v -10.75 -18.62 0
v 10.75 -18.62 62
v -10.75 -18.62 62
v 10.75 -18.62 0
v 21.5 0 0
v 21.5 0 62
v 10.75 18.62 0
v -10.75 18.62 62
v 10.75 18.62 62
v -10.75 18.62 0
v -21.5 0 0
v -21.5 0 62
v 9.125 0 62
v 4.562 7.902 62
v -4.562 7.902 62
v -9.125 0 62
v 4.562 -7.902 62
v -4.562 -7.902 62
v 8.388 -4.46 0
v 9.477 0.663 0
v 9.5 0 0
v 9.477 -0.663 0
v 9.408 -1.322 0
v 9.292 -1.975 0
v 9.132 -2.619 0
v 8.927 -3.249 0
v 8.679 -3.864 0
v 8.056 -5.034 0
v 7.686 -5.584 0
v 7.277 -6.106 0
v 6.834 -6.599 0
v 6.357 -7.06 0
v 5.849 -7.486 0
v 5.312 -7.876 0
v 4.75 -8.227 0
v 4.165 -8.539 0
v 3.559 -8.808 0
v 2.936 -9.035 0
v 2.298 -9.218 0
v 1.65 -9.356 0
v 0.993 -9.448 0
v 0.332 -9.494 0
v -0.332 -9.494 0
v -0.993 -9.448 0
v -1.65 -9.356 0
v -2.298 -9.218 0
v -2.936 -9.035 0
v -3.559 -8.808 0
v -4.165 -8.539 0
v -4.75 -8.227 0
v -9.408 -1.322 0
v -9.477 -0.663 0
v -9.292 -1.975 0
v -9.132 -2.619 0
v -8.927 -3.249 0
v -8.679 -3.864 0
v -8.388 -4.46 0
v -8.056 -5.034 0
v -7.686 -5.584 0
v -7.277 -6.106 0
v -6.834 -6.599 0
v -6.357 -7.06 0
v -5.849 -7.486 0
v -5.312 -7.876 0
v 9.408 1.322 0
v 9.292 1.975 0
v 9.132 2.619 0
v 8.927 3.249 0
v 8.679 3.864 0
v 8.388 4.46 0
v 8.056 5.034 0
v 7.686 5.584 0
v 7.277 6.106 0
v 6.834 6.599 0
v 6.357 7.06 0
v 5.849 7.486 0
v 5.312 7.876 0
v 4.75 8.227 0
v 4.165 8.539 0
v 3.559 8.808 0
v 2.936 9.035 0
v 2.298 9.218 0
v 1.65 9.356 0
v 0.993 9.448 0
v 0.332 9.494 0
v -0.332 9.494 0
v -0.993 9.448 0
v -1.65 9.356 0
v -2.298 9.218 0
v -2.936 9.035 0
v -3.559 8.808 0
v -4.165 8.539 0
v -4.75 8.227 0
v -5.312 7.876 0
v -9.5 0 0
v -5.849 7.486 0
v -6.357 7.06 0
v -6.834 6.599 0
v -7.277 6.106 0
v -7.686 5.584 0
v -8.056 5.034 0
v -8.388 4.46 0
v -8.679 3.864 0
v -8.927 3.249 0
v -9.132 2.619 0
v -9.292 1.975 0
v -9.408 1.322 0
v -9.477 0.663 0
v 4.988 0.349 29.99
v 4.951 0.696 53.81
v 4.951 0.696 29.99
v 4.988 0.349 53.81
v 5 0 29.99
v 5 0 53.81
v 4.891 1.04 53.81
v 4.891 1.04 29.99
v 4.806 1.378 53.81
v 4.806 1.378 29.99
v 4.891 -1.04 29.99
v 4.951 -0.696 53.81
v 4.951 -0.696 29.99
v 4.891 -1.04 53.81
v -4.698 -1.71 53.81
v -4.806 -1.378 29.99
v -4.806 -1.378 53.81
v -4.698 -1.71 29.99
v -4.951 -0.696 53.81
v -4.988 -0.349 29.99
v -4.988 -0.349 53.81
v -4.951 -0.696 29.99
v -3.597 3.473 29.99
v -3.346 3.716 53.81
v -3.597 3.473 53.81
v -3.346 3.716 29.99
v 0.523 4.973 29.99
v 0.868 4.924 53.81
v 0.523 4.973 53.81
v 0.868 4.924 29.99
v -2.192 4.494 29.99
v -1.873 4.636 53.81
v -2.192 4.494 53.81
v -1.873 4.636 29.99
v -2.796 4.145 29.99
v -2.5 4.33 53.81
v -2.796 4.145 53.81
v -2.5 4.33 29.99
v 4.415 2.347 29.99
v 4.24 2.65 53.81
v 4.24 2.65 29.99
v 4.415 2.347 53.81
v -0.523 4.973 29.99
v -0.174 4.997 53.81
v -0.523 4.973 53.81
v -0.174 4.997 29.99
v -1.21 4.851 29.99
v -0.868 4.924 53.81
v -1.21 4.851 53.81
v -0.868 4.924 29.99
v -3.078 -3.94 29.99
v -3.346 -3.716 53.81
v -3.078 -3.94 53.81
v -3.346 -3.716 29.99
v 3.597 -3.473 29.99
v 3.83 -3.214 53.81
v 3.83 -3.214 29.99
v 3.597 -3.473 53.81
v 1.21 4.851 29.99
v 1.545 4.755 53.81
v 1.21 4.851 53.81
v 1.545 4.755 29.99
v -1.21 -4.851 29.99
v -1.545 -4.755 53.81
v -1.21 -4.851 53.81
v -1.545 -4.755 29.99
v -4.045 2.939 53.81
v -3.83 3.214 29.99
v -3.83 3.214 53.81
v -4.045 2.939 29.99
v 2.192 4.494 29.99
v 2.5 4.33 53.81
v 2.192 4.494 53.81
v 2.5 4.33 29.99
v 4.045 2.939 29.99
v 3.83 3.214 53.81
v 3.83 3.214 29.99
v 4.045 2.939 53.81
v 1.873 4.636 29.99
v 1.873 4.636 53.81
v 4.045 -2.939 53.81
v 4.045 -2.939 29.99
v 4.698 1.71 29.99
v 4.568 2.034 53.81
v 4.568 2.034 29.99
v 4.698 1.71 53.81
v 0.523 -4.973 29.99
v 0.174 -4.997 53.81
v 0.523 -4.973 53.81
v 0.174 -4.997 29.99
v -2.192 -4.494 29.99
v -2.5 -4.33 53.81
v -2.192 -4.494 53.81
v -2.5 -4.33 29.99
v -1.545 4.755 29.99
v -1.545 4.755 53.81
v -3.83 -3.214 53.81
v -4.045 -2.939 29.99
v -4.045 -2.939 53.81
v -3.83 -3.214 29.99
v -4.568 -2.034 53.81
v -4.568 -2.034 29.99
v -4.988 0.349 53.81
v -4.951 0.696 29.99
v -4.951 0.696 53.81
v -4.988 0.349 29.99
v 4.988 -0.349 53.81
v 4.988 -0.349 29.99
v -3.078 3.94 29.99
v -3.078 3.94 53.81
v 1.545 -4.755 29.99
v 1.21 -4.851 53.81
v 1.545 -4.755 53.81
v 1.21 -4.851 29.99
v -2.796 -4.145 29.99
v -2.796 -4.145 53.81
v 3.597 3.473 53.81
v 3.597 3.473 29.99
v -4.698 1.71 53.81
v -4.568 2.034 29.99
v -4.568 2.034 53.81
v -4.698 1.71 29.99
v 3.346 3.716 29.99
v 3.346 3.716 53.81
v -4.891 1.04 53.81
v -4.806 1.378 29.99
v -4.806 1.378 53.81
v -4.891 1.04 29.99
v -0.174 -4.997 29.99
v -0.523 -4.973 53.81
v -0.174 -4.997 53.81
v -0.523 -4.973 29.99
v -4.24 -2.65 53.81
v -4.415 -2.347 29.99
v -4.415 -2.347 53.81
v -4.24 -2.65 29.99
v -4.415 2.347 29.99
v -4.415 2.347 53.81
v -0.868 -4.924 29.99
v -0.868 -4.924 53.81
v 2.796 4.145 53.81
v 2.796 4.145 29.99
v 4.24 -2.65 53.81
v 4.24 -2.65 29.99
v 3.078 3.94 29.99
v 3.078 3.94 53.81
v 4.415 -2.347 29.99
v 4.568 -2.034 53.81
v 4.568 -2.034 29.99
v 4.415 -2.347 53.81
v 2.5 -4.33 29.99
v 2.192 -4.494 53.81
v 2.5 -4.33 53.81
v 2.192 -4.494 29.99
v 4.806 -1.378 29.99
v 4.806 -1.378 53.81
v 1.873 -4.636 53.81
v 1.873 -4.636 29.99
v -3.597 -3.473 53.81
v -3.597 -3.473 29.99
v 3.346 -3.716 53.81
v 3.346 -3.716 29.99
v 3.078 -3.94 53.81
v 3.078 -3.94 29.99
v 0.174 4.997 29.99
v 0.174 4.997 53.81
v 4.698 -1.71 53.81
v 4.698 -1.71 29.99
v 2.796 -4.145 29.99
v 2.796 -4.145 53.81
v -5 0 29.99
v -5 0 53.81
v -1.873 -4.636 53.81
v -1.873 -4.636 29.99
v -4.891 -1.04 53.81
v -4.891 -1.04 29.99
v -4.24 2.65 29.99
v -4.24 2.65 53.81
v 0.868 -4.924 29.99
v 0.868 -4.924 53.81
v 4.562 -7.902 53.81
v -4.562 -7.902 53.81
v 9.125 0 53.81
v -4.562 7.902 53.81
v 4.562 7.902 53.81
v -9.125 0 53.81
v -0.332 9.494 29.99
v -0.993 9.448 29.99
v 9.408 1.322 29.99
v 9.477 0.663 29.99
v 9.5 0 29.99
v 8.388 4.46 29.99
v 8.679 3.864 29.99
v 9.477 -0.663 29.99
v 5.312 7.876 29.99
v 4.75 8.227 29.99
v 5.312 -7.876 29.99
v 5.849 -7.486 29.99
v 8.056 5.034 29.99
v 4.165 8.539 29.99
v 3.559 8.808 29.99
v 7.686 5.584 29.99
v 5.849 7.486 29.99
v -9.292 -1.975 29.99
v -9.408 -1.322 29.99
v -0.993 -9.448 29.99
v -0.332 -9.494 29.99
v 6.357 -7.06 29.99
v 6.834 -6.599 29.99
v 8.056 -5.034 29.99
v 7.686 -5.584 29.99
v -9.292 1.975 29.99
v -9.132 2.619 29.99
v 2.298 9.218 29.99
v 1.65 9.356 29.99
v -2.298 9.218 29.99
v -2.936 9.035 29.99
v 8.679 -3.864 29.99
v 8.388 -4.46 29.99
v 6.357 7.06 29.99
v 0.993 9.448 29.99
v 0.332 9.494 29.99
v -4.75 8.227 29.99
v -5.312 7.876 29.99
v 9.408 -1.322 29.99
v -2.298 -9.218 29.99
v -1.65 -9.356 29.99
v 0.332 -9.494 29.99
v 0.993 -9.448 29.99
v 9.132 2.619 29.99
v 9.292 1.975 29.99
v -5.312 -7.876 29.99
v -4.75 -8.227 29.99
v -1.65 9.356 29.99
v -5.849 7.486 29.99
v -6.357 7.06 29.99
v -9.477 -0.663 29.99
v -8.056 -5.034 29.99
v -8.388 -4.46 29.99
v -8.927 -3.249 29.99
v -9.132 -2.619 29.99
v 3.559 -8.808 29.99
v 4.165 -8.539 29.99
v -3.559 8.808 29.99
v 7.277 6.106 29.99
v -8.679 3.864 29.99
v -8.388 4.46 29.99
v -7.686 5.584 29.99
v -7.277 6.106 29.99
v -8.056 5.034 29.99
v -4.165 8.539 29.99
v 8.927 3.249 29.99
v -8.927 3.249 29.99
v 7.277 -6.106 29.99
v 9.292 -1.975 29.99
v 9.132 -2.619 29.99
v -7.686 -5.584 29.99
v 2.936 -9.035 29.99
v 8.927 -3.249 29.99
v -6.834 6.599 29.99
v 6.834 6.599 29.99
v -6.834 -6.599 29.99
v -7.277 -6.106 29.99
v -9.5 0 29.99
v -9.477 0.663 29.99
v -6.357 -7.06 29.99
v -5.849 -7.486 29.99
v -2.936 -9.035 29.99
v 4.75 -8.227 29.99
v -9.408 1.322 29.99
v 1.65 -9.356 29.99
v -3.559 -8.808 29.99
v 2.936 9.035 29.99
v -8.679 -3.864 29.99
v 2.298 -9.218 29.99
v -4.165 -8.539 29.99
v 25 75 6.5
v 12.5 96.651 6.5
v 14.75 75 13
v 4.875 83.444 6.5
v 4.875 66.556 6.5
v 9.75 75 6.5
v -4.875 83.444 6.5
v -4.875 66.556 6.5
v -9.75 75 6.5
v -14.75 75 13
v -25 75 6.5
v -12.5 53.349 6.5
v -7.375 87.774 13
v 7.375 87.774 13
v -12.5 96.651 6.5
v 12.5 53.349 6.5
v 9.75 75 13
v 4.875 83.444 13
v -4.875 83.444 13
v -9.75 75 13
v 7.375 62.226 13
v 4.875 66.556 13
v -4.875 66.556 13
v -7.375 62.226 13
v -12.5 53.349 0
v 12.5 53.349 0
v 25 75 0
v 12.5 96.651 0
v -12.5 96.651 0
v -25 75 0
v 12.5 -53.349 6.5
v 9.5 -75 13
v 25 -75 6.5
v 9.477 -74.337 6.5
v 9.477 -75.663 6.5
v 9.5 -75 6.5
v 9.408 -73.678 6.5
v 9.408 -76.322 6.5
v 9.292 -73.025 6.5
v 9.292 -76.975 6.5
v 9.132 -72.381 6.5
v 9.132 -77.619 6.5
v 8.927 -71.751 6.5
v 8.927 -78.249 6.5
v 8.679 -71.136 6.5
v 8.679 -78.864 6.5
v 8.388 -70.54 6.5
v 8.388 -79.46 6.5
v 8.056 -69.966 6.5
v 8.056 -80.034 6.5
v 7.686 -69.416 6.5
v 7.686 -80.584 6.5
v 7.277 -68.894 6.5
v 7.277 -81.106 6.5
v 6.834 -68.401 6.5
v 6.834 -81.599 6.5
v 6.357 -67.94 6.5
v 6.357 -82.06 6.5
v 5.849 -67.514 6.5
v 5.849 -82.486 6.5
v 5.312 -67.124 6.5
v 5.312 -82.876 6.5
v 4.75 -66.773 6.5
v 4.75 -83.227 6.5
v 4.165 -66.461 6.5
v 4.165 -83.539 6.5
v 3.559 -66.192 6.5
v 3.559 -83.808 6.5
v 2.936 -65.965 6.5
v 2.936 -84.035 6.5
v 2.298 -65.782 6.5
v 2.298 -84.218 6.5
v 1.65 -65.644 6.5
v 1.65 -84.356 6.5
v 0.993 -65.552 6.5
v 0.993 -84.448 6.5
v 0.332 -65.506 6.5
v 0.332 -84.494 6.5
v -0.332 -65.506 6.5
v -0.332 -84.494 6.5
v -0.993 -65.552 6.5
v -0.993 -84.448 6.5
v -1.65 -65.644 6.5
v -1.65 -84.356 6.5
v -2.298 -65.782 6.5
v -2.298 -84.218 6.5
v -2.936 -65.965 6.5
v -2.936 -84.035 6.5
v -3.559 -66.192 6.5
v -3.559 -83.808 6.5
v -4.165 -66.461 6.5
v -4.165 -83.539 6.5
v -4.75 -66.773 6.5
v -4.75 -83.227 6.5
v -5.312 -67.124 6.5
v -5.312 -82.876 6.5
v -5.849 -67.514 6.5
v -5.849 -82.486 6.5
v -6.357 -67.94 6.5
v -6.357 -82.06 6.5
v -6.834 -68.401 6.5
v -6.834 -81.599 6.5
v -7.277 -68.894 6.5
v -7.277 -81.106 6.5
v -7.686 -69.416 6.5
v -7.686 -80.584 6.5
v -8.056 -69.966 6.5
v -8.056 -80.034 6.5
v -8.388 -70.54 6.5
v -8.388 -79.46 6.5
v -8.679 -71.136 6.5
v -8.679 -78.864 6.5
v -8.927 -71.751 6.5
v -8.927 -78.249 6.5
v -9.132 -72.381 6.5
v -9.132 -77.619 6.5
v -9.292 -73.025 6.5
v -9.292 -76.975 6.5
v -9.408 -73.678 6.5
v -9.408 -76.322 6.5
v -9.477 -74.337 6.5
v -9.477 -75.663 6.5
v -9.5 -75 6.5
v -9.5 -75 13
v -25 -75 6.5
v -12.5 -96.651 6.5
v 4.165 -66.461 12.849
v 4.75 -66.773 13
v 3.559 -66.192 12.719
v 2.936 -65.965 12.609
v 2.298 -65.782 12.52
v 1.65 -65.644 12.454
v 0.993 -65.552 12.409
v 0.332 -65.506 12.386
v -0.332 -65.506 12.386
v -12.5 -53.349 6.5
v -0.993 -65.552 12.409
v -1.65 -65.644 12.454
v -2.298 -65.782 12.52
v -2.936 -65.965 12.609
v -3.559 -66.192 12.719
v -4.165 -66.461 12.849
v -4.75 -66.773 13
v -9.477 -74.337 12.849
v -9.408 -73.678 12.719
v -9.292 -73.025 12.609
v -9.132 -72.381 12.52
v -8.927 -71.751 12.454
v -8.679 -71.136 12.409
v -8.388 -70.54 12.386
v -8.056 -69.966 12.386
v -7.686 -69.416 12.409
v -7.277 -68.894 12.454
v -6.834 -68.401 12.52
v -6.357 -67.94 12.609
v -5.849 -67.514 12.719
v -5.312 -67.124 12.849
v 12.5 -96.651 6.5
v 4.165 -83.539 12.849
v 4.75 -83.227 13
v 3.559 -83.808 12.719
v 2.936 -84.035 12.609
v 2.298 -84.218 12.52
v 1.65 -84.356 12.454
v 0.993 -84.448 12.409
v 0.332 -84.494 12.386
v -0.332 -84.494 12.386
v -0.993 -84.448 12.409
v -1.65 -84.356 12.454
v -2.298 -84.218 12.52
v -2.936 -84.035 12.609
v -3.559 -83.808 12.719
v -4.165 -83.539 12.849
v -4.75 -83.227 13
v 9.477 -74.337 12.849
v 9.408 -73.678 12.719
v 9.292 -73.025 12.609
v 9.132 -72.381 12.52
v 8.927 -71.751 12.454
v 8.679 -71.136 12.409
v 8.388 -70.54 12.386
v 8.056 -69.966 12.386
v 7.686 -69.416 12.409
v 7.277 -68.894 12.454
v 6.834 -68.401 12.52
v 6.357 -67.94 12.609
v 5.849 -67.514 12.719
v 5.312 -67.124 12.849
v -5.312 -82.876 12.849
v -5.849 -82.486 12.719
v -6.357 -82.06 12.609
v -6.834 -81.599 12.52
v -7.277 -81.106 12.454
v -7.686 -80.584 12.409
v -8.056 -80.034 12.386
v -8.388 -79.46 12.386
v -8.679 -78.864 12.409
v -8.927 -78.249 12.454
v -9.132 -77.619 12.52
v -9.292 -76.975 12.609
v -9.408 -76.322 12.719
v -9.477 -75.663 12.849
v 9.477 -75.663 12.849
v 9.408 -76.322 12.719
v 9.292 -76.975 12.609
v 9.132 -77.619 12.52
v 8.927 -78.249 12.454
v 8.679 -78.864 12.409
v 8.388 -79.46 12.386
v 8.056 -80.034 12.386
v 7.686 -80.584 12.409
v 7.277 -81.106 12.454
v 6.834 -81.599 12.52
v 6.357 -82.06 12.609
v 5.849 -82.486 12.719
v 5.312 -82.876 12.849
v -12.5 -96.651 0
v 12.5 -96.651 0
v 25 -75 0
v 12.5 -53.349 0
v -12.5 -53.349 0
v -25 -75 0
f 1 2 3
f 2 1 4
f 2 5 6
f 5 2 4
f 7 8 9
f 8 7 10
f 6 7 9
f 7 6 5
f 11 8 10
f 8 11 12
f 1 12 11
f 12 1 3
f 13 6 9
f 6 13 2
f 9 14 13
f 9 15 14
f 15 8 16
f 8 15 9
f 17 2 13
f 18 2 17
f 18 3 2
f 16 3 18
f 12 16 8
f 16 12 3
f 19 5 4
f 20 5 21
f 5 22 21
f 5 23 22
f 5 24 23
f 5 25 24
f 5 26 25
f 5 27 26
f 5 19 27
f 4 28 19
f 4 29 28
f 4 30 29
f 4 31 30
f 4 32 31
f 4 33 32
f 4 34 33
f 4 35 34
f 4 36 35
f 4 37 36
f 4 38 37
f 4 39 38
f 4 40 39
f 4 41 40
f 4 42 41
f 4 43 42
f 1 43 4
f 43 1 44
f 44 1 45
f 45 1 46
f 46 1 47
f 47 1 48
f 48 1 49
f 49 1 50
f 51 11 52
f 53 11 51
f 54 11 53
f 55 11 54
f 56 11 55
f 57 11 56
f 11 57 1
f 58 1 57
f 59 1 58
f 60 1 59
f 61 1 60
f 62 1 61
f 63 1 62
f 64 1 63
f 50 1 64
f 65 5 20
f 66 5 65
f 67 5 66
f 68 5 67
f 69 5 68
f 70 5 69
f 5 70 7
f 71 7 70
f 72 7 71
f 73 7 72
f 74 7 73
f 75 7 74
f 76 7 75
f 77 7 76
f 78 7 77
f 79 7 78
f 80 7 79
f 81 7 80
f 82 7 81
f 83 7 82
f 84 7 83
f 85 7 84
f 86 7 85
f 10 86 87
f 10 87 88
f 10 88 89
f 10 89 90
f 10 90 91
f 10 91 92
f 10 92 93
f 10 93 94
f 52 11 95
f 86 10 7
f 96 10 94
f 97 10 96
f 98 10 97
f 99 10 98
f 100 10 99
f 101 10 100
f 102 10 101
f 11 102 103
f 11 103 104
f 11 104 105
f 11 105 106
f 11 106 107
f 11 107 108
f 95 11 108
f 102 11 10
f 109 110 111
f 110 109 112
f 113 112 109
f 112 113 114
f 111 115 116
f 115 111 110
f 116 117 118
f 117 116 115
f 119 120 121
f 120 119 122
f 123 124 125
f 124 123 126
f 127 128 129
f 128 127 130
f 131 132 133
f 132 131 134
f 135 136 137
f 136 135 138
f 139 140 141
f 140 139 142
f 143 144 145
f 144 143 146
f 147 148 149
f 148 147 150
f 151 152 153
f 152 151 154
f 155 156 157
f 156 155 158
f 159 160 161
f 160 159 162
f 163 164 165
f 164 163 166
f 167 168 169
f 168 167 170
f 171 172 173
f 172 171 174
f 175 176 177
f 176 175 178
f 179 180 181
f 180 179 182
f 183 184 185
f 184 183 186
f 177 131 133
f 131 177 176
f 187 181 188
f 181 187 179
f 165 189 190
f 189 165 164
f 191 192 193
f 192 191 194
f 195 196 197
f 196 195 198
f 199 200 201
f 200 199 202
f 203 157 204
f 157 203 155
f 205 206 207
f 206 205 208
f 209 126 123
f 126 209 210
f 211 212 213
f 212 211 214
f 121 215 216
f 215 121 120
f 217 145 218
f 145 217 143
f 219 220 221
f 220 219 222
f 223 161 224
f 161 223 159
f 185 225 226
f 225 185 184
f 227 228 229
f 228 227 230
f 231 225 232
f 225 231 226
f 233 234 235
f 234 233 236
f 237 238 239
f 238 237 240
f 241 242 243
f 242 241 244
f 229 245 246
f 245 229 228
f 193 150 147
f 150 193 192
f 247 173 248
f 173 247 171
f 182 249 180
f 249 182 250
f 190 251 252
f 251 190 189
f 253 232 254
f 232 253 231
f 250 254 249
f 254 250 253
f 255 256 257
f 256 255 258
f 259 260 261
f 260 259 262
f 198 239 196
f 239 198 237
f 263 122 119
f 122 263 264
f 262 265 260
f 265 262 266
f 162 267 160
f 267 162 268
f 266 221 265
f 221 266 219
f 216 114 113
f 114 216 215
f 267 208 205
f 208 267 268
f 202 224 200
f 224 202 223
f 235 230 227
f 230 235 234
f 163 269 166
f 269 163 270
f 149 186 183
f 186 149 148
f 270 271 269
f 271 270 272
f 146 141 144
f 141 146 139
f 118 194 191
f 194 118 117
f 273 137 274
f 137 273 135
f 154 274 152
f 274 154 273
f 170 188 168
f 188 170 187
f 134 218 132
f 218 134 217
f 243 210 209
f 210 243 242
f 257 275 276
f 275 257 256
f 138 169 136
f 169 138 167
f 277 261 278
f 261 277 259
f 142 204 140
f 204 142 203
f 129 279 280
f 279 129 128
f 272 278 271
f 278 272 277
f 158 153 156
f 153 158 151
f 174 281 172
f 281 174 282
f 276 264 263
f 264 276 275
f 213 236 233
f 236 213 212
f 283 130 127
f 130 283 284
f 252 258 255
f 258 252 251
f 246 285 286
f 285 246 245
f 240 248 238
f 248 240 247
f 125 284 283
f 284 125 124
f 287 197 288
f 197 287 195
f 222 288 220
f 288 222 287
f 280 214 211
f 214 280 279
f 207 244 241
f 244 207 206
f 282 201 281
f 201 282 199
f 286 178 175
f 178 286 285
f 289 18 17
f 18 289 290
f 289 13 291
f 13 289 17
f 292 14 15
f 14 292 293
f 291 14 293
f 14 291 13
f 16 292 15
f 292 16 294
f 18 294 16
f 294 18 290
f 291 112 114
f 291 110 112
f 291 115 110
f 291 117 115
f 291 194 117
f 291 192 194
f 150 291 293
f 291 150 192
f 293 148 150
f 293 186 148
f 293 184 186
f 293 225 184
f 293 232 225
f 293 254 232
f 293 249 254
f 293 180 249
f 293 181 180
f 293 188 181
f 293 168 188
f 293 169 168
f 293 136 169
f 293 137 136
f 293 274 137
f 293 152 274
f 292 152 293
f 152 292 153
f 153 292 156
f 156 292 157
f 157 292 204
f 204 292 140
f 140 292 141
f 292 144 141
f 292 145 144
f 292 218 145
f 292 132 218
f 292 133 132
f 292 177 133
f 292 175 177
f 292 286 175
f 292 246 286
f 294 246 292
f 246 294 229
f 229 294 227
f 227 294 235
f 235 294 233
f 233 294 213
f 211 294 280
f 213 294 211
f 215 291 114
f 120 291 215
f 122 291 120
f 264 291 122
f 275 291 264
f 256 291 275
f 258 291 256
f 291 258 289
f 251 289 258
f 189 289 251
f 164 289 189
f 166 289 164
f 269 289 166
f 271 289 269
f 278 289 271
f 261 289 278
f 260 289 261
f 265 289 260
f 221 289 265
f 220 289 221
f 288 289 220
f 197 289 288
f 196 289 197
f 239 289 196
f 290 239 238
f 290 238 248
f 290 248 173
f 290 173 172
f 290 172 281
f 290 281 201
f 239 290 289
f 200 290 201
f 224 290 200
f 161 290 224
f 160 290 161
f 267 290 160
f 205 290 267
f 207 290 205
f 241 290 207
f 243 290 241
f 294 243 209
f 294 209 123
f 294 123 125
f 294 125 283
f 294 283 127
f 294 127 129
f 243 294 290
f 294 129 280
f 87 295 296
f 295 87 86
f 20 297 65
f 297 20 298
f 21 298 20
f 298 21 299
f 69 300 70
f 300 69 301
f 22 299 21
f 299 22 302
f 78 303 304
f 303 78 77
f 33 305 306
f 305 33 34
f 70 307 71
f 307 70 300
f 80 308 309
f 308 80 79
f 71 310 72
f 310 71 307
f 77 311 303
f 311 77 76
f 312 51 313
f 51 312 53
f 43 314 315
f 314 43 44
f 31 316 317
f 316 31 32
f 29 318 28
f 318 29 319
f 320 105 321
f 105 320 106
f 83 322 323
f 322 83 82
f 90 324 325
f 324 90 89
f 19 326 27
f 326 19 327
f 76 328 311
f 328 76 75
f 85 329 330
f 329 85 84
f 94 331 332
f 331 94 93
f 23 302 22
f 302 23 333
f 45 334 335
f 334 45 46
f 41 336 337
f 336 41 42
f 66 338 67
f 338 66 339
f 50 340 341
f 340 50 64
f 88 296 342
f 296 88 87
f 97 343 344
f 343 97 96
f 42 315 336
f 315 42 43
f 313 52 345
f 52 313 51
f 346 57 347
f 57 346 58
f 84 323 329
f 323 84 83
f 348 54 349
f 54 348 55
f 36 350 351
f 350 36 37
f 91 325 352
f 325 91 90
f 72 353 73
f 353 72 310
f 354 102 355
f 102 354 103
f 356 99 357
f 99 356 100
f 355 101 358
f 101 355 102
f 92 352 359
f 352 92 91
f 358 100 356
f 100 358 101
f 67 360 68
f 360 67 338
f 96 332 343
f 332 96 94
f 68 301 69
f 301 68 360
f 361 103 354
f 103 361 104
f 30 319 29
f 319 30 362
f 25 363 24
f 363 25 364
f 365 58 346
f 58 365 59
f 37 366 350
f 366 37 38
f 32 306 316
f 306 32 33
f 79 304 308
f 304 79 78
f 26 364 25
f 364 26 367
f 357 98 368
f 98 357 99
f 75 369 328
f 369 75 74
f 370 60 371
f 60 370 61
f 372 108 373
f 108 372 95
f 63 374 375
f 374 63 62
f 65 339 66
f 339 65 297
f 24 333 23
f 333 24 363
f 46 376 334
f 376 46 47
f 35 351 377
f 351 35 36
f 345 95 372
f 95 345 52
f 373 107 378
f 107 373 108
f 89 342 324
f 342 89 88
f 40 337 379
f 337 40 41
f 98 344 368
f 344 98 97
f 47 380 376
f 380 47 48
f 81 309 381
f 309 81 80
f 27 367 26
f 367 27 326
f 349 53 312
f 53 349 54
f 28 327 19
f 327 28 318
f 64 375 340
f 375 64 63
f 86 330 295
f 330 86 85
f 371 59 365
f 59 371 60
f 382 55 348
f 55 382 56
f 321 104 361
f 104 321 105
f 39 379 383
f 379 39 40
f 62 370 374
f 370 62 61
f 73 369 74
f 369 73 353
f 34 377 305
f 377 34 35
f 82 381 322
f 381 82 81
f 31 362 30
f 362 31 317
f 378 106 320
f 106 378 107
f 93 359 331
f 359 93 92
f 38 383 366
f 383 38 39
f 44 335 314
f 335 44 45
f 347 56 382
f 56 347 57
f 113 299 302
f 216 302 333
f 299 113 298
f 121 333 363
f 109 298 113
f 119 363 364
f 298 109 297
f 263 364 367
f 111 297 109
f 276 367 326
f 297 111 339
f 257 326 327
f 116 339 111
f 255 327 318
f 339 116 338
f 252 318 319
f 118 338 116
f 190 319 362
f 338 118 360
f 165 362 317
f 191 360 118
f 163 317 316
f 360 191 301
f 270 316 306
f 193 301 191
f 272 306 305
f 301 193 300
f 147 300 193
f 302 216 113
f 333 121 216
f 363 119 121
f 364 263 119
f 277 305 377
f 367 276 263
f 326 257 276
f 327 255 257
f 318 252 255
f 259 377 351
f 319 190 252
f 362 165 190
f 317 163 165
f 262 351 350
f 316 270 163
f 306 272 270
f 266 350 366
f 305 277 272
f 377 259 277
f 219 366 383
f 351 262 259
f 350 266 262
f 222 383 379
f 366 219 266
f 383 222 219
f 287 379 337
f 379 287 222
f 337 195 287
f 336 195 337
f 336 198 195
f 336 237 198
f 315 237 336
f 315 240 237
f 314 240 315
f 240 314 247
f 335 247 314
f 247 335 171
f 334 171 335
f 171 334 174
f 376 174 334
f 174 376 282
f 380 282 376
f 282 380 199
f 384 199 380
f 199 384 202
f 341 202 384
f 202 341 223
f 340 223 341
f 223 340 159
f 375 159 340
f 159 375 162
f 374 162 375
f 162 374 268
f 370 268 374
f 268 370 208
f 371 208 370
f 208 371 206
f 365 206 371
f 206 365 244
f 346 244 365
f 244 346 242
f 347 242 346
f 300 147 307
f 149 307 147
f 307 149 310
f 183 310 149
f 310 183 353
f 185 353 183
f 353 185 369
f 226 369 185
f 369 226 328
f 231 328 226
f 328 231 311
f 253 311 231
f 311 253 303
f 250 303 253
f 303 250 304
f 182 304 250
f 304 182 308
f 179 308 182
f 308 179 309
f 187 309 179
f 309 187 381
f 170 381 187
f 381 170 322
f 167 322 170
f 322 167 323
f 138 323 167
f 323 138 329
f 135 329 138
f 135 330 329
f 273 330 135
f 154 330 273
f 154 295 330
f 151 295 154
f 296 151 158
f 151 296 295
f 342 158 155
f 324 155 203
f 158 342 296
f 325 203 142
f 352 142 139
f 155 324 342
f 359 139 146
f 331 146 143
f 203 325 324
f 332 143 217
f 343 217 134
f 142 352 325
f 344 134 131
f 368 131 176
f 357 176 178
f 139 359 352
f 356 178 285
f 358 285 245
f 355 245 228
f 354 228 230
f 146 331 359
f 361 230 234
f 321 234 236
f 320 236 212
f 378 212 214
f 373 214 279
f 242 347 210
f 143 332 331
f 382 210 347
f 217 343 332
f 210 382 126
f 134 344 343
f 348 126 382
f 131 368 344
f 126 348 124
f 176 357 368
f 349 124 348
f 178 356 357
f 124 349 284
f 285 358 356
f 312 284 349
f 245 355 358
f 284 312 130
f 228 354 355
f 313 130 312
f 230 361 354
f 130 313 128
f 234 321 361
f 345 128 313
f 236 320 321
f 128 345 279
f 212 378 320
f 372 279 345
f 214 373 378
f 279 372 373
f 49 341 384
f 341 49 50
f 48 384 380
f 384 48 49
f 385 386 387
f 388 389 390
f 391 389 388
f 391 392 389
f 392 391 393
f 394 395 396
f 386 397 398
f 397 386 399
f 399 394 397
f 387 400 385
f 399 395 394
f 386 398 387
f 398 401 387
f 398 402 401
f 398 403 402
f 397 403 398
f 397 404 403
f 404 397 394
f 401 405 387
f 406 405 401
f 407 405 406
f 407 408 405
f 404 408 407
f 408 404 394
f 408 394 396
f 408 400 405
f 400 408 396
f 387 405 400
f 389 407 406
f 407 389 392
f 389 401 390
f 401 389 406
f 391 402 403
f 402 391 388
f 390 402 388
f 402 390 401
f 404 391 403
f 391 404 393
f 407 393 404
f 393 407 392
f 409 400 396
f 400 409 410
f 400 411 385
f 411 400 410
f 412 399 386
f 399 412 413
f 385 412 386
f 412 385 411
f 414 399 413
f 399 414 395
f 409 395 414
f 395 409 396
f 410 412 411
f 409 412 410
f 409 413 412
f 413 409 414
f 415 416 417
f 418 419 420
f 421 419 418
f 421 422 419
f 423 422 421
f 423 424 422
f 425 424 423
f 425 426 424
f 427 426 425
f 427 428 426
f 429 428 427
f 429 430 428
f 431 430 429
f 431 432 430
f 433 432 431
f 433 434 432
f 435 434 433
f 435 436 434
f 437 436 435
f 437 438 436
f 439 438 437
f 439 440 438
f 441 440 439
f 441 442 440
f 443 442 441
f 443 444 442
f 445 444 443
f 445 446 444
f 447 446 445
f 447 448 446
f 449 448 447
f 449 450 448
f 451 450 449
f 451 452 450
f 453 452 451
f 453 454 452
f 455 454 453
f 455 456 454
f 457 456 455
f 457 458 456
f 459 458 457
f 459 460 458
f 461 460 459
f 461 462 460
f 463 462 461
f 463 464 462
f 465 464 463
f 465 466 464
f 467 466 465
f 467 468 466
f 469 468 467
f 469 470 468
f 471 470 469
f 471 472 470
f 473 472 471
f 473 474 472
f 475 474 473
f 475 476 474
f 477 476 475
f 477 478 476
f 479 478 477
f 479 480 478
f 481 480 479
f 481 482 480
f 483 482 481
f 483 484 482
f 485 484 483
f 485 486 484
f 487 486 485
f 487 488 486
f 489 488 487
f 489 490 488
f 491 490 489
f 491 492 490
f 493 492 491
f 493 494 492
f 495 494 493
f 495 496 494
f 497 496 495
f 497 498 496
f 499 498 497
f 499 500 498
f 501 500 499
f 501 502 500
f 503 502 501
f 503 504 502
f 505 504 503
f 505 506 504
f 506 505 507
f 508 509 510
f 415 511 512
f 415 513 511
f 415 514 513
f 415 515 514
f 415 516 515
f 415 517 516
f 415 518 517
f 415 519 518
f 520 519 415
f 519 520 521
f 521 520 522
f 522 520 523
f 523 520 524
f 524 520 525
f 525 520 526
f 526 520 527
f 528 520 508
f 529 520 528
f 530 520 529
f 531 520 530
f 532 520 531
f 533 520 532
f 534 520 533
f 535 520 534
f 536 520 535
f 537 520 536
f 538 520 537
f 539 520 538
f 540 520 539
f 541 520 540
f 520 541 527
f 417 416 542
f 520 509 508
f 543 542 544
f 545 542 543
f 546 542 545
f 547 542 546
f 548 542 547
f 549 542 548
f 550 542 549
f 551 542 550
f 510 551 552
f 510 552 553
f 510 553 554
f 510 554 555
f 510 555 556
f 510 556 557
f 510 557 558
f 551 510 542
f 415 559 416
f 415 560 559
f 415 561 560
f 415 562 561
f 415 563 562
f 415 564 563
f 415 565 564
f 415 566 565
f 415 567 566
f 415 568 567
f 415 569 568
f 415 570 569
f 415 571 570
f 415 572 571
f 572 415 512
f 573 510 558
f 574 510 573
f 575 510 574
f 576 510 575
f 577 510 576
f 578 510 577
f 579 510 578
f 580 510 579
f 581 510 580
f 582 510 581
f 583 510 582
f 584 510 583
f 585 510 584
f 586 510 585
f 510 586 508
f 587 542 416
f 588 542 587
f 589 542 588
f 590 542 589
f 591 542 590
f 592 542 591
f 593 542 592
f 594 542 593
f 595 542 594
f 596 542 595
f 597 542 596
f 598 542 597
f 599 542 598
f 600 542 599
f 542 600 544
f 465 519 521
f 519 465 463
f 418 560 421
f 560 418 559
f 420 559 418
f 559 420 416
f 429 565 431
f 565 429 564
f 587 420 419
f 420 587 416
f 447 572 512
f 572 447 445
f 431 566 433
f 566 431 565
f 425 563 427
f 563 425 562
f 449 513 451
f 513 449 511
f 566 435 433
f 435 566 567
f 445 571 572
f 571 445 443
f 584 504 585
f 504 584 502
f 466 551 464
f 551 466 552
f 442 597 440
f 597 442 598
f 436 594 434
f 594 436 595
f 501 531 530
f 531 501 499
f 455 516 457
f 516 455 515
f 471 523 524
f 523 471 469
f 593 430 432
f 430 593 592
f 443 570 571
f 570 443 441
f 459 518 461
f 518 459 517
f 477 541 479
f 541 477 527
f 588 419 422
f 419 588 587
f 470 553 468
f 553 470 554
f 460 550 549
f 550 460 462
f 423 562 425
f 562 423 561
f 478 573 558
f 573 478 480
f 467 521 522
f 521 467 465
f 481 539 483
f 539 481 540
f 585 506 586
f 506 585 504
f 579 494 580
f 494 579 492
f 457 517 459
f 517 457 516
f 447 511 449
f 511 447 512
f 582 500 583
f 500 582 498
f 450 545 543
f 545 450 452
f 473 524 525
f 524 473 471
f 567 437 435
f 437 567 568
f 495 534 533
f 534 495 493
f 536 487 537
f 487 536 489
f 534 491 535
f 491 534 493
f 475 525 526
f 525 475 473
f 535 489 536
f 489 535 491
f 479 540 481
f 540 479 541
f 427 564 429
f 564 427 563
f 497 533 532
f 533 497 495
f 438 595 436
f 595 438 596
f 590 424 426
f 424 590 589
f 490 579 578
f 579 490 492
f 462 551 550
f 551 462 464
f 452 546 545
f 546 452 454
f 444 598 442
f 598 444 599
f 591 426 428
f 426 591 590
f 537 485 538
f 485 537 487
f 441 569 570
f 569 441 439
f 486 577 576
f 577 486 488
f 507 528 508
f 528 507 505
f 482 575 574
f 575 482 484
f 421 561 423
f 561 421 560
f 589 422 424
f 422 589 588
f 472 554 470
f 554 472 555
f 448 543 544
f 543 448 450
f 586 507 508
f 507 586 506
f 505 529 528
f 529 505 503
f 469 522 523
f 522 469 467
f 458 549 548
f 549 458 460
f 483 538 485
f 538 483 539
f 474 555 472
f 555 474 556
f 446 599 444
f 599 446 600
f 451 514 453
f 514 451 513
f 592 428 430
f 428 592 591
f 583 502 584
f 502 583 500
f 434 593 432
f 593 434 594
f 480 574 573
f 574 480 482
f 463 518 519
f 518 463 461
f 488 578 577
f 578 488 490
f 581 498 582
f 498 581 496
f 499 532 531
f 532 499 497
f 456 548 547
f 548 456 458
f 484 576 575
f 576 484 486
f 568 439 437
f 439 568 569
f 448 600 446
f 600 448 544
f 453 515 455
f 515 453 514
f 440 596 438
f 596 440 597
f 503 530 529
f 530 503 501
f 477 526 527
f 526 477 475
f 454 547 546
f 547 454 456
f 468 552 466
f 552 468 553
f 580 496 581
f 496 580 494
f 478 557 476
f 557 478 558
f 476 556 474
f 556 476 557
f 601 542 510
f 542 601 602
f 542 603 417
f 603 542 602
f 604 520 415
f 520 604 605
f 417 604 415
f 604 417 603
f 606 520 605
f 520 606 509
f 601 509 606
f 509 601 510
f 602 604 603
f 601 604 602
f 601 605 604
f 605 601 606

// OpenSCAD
eps = 0.01;
$fn = 90;

// thread diameter
m_d = 10;

// screw diameter
s_d = 3.5;
// screw head diameter
s_h = 7;
// screw head conic part height
s_c = 2.5;

// nut diameter
n_d = 18.25;
// nut thickness
n_t = 8.2;

// bolt head diamater
b_d = 19.5;
// bolt head thickness
b_t = 6.5;

// base leg dimensions
a = 50;
// base thicknes
t = 5;
// total leg heigh
h = 75-2*b_t;

// handle diameter
h_d = 19;

// handle hole heigh
hhh = 30;

module base()
{
    difference()
    {
        // cylinder 
        cylinder(d=a-s_h,h=h,$fn=6);
        // bolt hole
        translate([0,0,-eps])
            cylinder(d=m_d,h=h+2*eps);
        // nut hole
        translate([0,0,h-n_t+eps])
            cylinder(d=n_d, h=n_t+2*eps, $fn=6);
        // handle hole
        translate([0,0,-eps])
            cylinder(d=h_d, h=hhh);
        
    }
}

base();

module foot()
{
    translate([0,0,b_t])
    difference()
    {
        cylinder(d1=a,d2=b_d+2*t,h=b_t, $fn=6);
        translate([0,0,-eps])cylinder(d=b_d,h=b_t+2*eps,$fn=6);
    }
    cylinder(d=a,h=b_t,$fn=6);
}

translate([0,1.5*a,0]) foot();

module foot_ender()
{
    translate([0,0,b_t])
    difference()
    {
        cylinder(d1=a,d2=h_d,h=b_t,$fn=6);
        translate([0,0,-eps])cylinder(d=h_d,h=b_t+2*eps);
    }
    cylinder(d=a,h=b_t,$fn=6);
}

translate([0,-1.5*a,0]) foot_ender();
